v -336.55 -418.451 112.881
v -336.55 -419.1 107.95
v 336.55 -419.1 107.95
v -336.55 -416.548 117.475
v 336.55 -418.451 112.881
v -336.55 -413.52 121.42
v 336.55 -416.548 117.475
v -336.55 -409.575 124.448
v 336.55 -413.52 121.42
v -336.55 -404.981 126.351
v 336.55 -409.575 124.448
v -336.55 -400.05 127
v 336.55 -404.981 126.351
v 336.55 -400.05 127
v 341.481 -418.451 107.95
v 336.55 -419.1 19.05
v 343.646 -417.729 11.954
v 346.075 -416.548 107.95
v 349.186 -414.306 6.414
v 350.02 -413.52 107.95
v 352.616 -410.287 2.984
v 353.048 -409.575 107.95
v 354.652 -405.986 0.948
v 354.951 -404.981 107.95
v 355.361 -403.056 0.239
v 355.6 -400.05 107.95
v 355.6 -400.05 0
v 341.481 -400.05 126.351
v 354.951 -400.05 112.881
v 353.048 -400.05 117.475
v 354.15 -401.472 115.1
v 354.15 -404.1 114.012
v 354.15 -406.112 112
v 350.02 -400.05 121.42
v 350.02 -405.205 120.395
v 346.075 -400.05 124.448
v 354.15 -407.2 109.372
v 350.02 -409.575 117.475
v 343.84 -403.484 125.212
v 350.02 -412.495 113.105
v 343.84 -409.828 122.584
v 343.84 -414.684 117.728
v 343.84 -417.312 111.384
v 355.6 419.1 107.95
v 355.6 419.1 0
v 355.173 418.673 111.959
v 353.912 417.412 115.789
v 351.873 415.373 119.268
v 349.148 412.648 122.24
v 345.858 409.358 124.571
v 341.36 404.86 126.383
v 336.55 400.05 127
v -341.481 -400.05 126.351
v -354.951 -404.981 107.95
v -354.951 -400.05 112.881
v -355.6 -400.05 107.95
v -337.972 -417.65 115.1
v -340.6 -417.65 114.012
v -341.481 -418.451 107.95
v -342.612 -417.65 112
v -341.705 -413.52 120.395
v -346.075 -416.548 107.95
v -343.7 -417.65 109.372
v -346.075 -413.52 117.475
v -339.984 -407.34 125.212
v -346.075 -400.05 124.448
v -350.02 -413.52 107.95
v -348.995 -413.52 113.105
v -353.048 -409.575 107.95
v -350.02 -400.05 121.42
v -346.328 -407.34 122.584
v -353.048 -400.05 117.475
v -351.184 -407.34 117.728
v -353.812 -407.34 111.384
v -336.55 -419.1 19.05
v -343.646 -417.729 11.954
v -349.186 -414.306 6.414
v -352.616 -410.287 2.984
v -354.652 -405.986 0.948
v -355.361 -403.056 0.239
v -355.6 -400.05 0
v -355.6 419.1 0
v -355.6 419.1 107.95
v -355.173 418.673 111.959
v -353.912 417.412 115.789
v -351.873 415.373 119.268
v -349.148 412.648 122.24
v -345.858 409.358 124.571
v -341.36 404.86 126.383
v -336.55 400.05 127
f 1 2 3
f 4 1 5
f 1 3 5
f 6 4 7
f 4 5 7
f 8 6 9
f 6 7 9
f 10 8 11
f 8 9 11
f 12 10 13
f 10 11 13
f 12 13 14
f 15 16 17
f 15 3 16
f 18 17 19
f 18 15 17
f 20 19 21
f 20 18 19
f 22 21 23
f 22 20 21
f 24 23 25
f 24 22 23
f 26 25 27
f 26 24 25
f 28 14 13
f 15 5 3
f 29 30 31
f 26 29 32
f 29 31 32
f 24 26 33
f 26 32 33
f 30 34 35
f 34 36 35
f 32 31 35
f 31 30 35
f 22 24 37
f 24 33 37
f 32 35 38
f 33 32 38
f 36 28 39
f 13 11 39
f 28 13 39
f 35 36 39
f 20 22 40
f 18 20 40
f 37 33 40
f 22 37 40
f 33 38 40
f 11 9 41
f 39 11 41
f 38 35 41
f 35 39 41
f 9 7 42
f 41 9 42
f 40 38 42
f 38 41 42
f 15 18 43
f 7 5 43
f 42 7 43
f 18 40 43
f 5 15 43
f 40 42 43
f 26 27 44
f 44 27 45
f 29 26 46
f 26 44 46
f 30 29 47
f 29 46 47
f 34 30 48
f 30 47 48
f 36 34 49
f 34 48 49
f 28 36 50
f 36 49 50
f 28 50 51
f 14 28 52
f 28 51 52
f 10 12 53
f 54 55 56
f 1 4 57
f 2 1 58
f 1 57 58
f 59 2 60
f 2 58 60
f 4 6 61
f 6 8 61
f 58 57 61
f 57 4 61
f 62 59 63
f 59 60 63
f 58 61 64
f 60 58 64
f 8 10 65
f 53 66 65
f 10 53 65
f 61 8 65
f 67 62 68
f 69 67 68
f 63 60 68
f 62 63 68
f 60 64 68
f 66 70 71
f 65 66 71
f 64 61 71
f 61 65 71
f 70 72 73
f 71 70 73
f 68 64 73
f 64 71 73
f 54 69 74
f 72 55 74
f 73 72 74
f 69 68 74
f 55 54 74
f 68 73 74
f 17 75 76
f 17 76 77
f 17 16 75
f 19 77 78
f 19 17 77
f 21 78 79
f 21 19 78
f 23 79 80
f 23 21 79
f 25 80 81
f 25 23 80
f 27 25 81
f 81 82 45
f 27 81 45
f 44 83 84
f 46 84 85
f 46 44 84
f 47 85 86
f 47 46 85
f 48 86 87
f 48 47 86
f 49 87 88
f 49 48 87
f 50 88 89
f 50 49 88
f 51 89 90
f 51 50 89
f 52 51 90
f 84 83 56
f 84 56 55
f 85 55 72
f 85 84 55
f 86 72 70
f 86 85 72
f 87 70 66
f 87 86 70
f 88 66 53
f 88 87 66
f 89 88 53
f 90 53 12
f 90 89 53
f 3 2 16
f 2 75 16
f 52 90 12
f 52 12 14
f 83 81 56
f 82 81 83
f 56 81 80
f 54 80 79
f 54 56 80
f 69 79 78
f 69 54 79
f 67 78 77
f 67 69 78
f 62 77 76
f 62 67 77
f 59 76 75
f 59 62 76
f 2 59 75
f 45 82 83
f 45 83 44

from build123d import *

# Parameters (mm, degrees)
F0_W     = 711.2
F0_H     = 838.2
F1_DEPTH = 127
F2_R     = 19.05


with BuildPart() as f1:
    # F0 (on Top) → F1 (new body)
    with BuildSketch(Plane.XY):
        Rectangle(F0_W, F0_H)
    extrude(amount=F1_DEPTH)

    # F2
    f2_edges = [f1.edges().sort_by_distance(p)[0] for p in [
        (-355.6, 0, 127),
        (0, -419.1, 127),
        (355.6, 0, 127),
        (0, 419.1, 127),
        (0, -419.1, 0),
        (355.6, -419.1, 63.5),
        (-355.6, -419.1, 63.5),
    ]]
    fillet(f2_edges, radius=F2_R)


solid = f1.part
